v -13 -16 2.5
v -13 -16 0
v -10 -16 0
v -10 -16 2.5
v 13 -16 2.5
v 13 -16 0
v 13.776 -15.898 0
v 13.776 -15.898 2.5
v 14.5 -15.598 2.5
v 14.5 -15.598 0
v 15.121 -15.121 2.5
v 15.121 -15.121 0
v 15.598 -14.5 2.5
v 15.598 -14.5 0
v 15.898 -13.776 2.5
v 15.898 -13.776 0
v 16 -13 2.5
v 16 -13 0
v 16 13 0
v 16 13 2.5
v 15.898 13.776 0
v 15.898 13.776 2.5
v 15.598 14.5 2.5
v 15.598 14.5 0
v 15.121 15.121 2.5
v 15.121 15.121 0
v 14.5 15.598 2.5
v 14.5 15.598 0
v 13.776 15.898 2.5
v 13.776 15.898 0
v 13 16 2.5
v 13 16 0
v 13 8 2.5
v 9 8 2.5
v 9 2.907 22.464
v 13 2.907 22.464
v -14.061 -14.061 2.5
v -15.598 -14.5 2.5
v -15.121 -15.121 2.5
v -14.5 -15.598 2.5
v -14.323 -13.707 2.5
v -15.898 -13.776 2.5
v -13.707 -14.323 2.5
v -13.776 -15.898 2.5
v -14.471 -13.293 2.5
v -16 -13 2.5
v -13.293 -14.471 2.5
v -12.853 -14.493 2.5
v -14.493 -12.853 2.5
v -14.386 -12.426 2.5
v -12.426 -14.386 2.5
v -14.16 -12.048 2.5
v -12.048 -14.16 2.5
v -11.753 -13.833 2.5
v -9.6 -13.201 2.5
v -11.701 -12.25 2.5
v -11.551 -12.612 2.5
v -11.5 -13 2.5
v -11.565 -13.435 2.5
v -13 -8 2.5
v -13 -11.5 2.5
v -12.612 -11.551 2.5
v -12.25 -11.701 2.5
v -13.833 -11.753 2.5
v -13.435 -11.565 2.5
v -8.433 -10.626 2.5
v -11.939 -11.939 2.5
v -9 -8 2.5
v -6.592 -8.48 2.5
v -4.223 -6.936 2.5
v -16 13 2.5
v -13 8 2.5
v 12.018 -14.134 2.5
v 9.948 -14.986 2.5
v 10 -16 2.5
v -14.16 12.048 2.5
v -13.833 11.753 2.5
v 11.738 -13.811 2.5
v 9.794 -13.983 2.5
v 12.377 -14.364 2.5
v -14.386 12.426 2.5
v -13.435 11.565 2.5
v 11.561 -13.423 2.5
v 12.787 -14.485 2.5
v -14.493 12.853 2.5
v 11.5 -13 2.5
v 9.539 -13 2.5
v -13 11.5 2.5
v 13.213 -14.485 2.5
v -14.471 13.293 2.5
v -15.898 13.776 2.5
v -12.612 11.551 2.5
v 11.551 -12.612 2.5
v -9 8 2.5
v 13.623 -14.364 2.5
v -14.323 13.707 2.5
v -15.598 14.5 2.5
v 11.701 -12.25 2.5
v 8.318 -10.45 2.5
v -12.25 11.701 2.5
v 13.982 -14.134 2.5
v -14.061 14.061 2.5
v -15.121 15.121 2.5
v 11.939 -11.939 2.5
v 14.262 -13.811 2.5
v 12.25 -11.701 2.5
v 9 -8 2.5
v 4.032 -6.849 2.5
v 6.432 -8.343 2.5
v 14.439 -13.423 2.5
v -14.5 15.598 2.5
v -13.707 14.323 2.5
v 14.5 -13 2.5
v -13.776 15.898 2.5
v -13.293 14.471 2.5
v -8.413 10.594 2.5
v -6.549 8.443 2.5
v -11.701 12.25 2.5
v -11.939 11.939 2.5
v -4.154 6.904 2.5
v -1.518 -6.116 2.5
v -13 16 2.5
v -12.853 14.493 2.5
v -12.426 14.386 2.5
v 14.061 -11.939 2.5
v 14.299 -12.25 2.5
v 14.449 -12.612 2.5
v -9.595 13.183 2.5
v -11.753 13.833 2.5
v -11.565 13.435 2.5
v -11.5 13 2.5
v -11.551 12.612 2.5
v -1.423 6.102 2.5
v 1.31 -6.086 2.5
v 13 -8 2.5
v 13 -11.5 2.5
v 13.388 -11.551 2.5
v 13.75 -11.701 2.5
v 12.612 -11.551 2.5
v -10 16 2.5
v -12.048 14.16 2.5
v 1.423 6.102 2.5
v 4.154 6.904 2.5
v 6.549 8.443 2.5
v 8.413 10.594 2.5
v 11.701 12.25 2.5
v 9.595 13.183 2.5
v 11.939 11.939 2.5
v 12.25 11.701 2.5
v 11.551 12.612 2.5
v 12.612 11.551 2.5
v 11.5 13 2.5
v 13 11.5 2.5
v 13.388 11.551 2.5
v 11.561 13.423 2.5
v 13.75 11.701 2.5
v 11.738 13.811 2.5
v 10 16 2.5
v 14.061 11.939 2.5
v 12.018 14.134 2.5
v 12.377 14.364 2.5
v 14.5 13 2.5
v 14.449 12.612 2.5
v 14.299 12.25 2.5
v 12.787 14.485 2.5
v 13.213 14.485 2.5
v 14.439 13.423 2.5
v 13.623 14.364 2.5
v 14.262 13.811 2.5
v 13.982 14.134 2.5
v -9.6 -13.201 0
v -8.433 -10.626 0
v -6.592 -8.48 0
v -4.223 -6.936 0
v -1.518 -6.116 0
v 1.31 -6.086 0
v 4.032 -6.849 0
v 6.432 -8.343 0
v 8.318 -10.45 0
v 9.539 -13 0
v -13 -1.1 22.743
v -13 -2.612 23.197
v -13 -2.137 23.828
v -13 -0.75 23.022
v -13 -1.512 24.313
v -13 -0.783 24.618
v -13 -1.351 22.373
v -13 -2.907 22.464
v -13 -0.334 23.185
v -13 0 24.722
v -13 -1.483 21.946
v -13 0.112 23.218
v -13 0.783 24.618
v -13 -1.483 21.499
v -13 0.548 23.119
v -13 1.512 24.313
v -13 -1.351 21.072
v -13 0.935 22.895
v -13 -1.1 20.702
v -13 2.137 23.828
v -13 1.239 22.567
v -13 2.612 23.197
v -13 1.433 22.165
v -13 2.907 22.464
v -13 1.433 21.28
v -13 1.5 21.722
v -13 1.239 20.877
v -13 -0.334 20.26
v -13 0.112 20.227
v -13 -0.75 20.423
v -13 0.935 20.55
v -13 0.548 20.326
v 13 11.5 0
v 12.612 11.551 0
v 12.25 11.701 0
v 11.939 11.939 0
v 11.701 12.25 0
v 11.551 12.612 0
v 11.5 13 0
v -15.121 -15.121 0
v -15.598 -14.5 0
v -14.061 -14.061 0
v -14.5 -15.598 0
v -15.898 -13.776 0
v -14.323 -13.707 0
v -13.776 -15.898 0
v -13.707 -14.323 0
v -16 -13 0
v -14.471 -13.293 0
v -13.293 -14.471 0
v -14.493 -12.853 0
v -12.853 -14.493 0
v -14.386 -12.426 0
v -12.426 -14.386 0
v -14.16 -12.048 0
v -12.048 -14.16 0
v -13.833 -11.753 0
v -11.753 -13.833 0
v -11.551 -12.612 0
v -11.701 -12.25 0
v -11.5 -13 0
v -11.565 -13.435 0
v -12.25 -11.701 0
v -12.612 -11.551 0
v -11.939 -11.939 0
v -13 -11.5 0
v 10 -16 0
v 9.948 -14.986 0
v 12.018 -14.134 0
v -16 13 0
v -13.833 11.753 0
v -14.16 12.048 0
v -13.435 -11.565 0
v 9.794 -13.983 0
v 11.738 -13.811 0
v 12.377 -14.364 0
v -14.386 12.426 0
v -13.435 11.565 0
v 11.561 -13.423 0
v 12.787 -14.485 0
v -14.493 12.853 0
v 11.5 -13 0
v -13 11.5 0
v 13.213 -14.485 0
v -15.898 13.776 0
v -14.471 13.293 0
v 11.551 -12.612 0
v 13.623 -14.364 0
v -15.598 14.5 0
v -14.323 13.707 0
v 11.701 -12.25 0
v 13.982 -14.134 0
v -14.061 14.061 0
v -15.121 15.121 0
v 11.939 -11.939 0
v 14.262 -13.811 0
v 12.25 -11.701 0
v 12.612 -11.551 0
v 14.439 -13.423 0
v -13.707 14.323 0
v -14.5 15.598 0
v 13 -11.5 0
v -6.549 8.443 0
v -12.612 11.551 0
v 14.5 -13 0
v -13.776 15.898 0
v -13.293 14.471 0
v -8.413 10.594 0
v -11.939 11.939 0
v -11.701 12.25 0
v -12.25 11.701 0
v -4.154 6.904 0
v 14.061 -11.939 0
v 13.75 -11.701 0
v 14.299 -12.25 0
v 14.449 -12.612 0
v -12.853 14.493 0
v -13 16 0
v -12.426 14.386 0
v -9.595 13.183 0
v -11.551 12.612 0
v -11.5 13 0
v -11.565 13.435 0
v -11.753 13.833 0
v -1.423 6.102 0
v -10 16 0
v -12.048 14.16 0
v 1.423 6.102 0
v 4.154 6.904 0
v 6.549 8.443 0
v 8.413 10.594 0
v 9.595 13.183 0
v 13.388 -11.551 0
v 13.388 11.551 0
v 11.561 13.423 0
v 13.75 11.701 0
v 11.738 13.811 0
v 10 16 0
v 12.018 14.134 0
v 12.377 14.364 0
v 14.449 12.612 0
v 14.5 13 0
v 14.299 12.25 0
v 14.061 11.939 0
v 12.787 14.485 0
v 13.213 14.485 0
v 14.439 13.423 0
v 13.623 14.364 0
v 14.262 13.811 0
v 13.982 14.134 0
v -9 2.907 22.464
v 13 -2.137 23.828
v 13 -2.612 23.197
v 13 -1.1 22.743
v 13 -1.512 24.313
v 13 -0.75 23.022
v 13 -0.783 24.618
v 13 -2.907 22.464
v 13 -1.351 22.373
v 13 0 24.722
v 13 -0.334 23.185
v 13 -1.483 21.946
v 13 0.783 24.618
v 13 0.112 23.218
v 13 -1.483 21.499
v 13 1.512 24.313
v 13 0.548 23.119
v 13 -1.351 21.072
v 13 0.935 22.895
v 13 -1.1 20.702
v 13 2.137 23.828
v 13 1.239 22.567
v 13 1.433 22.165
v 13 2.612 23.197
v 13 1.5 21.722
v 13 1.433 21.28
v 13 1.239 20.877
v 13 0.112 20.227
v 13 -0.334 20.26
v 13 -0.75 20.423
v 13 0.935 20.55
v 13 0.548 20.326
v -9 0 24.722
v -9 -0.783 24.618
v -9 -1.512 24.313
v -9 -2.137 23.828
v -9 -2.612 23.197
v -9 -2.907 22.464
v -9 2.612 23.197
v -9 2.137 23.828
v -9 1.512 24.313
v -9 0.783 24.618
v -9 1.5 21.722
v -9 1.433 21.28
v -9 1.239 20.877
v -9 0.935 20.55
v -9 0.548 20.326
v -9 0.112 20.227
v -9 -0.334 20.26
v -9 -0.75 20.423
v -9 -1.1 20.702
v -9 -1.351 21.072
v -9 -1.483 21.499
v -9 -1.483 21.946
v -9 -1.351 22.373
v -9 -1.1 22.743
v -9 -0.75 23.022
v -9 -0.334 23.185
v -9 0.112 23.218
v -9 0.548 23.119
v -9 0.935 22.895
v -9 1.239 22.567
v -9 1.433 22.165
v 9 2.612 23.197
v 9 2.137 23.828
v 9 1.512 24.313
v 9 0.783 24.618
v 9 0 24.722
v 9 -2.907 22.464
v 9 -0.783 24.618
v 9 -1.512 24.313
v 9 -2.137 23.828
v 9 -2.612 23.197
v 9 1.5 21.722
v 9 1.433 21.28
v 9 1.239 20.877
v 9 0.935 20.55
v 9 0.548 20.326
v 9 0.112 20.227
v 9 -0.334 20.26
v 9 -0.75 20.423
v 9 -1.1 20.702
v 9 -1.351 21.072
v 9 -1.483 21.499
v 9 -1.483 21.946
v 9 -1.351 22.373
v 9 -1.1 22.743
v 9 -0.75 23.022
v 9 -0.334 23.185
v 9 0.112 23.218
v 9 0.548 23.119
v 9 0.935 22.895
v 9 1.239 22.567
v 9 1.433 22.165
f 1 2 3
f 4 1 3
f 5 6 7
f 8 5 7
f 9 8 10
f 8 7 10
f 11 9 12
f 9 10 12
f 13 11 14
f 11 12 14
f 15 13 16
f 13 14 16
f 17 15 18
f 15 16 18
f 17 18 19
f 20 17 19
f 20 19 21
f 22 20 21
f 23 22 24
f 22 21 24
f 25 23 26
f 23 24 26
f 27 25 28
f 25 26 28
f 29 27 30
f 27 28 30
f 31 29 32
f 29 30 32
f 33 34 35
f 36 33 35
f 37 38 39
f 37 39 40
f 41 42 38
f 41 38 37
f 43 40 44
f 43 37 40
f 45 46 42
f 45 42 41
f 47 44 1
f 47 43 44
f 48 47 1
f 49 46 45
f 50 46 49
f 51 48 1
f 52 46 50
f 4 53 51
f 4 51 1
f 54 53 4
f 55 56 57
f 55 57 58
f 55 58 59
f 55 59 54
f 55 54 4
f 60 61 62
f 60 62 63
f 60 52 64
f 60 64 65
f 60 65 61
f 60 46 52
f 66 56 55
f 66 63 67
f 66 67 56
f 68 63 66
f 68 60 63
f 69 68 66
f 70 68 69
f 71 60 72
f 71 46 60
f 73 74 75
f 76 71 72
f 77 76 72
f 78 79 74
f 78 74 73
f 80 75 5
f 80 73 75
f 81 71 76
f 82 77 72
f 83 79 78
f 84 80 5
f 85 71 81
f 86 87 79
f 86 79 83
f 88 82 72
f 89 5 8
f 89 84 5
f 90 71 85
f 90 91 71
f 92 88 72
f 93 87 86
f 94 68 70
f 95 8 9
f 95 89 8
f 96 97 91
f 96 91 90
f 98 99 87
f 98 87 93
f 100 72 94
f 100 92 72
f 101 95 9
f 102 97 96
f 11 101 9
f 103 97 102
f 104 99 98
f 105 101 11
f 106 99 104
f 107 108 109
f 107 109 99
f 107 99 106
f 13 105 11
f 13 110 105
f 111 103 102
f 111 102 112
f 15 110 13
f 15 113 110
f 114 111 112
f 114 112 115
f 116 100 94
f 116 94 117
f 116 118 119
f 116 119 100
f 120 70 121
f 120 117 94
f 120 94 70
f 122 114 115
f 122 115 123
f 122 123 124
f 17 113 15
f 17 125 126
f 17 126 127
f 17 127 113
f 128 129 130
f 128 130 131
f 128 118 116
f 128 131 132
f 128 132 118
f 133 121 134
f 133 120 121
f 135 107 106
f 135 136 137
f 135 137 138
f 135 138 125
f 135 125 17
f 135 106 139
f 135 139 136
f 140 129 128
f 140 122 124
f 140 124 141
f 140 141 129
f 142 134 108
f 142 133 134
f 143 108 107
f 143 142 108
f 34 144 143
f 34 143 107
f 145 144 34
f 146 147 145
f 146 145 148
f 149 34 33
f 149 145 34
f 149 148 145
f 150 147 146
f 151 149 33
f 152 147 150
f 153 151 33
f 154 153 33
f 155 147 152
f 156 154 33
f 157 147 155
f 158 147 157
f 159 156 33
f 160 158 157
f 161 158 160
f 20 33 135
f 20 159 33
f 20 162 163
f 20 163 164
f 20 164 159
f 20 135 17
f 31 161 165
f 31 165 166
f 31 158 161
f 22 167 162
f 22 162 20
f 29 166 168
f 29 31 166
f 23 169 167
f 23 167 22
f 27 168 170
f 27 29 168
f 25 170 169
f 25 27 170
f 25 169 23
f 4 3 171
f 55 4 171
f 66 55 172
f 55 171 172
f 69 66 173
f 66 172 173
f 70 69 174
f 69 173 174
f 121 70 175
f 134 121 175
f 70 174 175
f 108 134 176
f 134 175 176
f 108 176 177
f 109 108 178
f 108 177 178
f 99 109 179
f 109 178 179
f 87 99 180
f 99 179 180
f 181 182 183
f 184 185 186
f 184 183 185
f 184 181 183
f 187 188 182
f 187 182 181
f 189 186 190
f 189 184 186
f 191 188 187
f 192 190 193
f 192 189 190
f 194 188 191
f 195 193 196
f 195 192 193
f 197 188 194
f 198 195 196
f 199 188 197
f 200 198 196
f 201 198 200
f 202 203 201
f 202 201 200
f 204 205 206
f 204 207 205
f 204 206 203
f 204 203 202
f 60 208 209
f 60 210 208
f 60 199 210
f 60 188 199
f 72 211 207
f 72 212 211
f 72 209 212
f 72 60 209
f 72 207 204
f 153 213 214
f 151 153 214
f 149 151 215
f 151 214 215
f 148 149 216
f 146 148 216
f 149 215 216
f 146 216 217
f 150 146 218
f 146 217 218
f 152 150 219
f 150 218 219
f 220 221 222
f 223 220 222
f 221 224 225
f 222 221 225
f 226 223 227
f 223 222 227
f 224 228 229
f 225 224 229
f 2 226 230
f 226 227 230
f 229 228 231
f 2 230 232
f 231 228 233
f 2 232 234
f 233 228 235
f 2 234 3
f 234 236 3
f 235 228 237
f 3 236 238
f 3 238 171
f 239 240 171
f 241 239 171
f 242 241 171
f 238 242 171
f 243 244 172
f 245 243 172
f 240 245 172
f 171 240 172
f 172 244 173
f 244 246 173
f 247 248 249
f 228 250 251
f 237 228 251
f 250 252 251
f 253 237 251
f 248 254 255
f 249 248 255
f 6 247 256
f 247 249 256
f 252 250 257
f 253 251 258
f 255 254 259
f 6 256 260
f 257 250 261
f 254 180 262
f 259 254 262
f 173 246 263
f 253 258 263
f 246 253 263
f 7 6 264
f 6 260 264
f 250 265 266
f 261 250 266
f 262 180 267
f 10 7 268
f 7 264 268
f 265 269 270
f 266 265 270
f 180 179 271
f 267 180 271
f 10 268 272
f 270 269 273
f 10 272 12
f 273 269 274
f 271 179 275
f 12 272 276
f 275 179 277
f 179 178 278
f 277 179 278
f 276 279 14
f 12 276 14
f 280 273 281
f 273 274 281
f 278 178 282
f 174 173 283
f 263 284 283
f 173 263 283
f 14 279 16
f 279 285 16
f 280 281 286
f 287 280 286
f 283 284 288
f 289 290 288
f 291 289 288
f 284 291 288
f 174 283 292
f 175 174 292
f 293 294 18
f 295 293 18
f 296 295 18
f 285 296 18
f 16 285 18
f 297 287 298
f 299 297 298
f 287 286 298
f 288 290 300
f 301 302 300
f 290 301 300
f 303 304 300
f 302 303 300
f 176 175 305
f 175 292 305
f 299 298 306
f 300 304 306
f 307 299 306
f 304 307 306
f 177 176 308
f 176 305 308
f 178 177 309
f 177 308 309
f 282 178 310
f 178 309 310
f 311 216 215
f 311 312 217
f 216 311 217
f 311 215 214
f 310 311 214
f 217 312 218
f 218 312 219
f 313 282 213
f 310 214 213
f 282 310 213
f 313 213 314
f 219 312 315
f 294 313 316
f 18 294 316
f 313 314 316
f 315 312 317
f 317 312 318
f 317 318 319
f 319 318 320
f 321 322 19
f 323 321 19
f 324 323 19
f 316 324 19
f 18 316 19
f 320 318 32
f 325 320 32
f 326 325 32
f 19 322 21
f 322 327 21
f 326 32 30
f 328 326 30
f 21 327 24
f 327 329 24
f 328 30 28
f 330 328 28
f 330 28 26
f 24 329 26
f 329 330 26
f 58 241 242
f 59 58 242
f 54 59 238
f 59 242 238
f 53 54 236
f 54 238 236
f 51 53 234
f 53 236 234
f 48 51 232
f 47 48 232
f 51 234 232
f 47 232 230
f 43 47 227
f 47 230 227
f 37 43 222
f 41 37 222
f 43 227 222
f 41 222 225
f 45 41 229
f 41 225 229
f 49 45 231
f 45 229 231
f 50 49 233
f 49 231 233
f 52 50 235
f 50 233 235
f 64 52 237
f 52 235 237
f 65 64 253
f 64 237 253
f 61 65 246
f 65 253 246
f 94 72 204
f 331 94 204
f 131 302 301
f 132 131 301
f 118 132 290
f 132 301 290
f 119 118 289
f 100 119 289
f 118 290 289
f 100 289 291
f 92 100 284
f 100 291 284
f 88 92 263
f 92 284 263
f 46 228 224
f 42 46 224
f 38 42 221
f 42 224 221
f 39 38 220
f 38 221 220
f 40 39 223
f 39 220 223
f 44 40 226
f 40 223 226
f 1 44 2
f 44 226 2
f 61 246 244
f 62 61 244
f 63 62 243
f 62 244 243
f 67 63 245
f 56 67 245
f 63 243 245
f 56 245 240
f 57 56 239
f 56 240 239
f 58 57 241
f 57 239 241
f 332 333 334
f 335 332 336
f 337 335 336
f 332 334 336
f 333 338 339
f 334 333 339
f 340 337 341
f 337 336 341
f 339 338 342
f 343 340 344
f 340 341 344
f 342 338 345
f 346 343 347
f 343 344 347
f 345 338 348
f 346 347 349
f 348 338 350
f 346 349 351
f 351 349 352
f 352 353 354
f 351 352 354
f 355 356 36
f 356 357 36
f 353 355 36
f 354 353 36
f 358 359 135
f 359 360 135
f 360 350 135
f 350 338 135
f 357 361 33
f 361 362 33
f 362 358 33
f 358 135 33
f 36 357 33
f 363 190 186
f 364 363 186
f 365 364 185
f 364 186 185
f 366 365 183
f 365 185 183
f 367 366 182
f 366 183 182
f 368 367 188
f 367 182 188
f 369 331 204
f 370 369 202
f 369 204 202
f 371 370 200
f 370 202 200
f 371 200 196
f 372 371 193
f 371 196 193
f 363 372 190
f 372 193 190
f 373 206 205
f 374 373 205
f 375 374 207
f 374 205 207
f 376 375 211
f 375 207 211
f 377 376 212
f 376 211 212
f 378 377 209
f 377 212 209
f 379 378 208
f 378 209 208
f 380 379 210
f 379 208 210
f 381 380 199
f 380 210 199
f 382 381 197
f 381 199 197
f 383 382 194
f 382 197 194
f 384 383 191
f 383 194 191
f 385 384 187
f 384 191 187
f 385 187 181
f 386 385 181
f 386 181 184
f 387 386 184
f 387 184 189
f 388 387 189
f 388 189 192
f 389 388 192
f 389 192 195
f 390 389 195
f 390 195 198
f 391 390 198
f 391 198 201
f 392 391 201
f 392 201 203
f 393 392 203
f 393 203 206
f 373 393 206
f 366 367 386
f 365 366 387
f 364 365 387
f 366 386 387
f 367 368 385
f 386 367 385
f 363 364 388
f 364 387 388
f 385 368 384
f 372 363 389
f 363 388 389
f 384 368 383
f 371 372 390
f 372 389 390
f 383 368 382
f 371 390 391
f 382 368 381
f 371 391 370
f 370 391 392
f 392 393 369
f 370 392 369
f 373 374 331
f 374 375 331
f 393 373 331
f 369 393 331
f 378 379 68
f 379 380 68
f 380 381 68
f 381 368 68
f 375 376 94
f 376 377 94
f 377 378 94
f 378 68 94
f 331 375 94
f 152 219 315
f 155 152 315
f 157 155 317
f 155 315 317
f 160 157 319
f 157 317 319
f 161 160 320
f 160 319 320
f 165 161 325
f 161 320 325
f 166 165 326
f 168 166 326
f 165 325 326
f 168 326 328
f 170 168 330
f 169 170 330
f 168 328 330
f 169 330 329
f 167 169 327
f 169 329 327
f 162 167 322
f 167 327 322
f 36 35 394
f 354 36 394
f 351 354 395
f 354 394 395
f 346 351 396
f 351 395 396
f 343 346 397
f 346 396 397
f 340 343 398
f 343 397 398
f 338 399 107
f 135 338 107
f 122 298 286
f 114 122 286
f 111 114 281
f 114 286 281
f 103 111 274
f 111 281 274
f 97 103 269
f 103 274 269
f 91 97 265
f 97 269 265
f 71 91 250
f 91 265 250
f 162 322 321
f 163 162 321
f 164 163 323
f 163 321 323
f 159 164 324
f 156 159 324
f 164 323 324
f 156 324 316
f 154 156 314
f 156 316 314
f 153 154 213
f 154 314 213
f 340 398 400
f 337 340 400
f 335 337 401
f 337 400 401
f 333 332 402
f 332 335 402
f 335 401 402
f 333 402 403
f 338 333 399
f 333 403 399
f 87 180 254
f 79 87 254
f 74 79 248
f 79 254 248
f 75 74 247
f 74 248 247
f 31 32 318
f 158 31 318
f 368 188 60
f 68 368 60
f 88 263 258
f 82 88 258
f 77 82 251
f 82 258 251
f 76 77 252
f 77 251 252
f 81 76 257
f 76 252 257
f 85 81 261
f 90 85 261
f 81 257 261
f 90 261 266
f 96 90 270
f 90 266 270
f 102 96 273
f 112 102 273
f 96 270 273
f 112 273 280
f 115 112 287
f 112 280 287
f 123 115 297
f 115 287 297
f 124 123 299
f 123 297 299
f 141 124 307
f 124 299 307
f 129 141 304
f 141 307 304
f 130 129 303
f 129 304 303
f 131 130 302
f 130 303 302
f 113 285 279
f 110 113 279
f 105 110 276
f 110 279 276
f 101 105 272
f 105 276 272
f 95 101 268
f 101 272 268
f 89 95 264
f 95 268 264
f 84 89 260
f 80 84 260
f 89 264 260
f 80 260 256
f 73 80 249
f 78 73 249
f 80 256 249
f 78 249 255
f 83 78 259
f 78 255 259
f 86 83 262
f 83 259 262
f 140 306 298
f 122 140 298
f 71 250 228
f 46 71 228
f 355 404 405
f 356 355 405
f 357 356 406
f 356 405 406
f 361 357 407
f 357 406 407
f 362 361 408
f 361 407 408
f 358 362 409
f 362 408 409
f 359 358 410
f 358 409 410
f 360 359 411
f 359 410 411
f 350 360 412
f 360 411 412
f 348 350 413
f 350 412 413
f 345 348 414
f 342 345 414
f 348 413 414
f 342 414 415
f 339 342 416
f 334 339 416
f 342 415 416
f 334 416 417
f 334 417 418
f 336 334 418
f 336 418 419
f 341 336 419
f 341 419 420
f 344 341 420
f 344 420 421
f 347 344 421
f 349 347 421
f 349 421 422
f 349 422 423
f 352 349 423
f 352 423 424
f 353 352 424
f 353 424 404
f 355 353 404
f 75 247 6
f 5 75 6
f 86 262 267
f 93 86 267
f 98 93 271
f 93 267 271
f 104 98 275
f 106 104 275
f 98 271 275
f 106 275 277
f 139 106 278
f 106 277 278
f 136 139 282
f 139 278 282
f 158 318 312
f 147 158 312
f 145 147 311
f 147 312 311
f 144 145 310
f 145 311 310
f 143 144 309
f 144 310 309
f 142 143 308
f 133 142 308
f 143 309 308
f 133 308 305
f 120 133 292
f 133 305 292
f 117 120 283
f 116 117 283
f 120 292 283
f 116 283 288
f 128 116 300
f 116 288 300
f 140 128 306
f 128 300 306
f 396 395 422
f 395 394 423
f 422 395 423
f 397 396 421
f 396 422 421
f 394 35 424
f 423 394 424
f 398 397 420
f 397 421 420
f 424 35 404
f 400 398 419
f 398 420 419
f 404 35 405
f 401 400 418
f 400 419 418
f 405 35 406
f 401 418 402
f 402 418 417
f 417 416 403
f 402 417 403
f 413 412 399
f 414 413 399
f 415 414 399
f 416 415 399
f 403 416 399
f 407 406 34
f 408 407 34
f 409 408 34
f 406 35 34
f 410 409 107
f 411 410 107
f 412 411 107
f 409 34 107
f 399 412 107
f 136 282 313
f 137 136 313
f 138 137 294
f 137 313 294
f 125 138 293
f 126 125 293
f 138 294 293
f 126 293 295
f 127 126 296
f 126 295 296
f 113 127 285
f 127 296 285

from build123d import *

# Parameters (mm, degrees)
SKETCH_1_W          = 4
SKETCH_1_H          = 16
EXTRUDE_1_DEPTH     = 25
EXTRUDE_1_2_DEPTH   = 25
SKETCH_1_4_R        = 1.5
SKETCH_1_4_W        = 4
SKETCH_1_4_H        = 16
EXTRUDE_2_DEPTH     = 2.5
SKETCH_5_R          = 1.5
CUT_EXTRUDE_1_DEPTH = 42.496987842


with BuildPart() as part:
    # 草图1 → 凸台-拉伸1 (new body)
    with BuildSketch(Plane.XY):
        with Locations((-11, 0)):
            Rectangle(SKETCH_1_W, SKETCH_1_H)
    extrude(amount=EXTRUDE_1_DEPTH)



with BuildPart() as body_2:
    # 草图1 → Extrude 1 2 (new body)
    with BuildSketch(Plane.XY):
        with Locations((11, 0)):
            Rectangle(SKETCH_1_W, SKETCH_1_H)
    extrude(amount=EXTRUDE_1_2_DEPTH)


with BuildPart() as part_1:
    add(part.part)

    add(body_2.part)  # 凸台-拉伸2 merges body 2
    # 草图1<4> → 凸台-拉伸2 (add)
    with BuildSketch(Plane.XY):
        with BuildLine():
            ThreePointArc((-10, -16), (0, -6), (10, -16))
            Line((10, -16), (13, -16))
            ThreePointArc((13, -16), (15.121320344, -15.121320344), (16, -13))
            Line((16, -13), (16, 13))
            ThreePointArc((16, 13), (15.121320344, 15.121320344), (13, 16))
            Line((13, 16), (10, 16))
            ThreePointArc((10, 16), (0, 6), (-10, 16))
            Line((-10, 16), (-13, 16))
            ThreePointArc((-13, 16), (-15.121320344, 15.121320344), (-16, 13))
            Line((-16, 13), (-16, -13))
            ThreePointArc((-16, -13), (-15.121320344, -15.121320344), (-13, -16))
            Line((-13, -16), (-10, -16))
        make_face()
        with Locations((-13, 13)):
            Circle(SKETCH_1_4_R, mode=Mode.SUBTRACT)
        with Locations((-11, 0)):
            Rectangle(SKETCH_1_4_W, SKETCH_1_4_H, mode=Mode.SUBTRACT)
        with Locations((-13, -13)):
            Circle(SKETCH_1_4_R, mode=Mode.SUBTRACT)
        with Locations((13, 13)):
            Circle(SKETCH_1_4_R, mode=Mode.SUBTRACT)
        with Locations((11, 0)):
            Rectangle(SKETCH_1_4_W, SKETCH_1_4_H, mode=Mode.SUBTRACT)
        with Locations((13, -13)):
            Circle(SKETCH_1_4_R, mode=Mode.SUBTRACT)
    extrude(amount=EXTRUDE_2_DEPTH)

    # 草图5 → 切除-拉伸1 (cut, through all)
    with BuildSketch(Plane.ZY.offset(13)):
        with BuildLine():
            Line((25, 8), (2.5, 8))
            Line((2.5, 8), (22.464054272, 2.90689625))
            ThreePointArc((22.464054272, 2.90689625), (24.722465308, 4.2e-08), (22.464054353, -2.906896229))
            Line((22.464054353, -2.906896229), (2.5, -8))
            Line((2.5, -8), (25, -8))
            Line((25, -8), (25, 8))
        make_face()
        with Locations((21.722465308, 0)):
            Circle(SKETCH_5_R)
    extrude(amount=-CUT_EXTRUDE_1_DEPTH, mode=Mode.SUBTRACT)


solid = part_1.part
